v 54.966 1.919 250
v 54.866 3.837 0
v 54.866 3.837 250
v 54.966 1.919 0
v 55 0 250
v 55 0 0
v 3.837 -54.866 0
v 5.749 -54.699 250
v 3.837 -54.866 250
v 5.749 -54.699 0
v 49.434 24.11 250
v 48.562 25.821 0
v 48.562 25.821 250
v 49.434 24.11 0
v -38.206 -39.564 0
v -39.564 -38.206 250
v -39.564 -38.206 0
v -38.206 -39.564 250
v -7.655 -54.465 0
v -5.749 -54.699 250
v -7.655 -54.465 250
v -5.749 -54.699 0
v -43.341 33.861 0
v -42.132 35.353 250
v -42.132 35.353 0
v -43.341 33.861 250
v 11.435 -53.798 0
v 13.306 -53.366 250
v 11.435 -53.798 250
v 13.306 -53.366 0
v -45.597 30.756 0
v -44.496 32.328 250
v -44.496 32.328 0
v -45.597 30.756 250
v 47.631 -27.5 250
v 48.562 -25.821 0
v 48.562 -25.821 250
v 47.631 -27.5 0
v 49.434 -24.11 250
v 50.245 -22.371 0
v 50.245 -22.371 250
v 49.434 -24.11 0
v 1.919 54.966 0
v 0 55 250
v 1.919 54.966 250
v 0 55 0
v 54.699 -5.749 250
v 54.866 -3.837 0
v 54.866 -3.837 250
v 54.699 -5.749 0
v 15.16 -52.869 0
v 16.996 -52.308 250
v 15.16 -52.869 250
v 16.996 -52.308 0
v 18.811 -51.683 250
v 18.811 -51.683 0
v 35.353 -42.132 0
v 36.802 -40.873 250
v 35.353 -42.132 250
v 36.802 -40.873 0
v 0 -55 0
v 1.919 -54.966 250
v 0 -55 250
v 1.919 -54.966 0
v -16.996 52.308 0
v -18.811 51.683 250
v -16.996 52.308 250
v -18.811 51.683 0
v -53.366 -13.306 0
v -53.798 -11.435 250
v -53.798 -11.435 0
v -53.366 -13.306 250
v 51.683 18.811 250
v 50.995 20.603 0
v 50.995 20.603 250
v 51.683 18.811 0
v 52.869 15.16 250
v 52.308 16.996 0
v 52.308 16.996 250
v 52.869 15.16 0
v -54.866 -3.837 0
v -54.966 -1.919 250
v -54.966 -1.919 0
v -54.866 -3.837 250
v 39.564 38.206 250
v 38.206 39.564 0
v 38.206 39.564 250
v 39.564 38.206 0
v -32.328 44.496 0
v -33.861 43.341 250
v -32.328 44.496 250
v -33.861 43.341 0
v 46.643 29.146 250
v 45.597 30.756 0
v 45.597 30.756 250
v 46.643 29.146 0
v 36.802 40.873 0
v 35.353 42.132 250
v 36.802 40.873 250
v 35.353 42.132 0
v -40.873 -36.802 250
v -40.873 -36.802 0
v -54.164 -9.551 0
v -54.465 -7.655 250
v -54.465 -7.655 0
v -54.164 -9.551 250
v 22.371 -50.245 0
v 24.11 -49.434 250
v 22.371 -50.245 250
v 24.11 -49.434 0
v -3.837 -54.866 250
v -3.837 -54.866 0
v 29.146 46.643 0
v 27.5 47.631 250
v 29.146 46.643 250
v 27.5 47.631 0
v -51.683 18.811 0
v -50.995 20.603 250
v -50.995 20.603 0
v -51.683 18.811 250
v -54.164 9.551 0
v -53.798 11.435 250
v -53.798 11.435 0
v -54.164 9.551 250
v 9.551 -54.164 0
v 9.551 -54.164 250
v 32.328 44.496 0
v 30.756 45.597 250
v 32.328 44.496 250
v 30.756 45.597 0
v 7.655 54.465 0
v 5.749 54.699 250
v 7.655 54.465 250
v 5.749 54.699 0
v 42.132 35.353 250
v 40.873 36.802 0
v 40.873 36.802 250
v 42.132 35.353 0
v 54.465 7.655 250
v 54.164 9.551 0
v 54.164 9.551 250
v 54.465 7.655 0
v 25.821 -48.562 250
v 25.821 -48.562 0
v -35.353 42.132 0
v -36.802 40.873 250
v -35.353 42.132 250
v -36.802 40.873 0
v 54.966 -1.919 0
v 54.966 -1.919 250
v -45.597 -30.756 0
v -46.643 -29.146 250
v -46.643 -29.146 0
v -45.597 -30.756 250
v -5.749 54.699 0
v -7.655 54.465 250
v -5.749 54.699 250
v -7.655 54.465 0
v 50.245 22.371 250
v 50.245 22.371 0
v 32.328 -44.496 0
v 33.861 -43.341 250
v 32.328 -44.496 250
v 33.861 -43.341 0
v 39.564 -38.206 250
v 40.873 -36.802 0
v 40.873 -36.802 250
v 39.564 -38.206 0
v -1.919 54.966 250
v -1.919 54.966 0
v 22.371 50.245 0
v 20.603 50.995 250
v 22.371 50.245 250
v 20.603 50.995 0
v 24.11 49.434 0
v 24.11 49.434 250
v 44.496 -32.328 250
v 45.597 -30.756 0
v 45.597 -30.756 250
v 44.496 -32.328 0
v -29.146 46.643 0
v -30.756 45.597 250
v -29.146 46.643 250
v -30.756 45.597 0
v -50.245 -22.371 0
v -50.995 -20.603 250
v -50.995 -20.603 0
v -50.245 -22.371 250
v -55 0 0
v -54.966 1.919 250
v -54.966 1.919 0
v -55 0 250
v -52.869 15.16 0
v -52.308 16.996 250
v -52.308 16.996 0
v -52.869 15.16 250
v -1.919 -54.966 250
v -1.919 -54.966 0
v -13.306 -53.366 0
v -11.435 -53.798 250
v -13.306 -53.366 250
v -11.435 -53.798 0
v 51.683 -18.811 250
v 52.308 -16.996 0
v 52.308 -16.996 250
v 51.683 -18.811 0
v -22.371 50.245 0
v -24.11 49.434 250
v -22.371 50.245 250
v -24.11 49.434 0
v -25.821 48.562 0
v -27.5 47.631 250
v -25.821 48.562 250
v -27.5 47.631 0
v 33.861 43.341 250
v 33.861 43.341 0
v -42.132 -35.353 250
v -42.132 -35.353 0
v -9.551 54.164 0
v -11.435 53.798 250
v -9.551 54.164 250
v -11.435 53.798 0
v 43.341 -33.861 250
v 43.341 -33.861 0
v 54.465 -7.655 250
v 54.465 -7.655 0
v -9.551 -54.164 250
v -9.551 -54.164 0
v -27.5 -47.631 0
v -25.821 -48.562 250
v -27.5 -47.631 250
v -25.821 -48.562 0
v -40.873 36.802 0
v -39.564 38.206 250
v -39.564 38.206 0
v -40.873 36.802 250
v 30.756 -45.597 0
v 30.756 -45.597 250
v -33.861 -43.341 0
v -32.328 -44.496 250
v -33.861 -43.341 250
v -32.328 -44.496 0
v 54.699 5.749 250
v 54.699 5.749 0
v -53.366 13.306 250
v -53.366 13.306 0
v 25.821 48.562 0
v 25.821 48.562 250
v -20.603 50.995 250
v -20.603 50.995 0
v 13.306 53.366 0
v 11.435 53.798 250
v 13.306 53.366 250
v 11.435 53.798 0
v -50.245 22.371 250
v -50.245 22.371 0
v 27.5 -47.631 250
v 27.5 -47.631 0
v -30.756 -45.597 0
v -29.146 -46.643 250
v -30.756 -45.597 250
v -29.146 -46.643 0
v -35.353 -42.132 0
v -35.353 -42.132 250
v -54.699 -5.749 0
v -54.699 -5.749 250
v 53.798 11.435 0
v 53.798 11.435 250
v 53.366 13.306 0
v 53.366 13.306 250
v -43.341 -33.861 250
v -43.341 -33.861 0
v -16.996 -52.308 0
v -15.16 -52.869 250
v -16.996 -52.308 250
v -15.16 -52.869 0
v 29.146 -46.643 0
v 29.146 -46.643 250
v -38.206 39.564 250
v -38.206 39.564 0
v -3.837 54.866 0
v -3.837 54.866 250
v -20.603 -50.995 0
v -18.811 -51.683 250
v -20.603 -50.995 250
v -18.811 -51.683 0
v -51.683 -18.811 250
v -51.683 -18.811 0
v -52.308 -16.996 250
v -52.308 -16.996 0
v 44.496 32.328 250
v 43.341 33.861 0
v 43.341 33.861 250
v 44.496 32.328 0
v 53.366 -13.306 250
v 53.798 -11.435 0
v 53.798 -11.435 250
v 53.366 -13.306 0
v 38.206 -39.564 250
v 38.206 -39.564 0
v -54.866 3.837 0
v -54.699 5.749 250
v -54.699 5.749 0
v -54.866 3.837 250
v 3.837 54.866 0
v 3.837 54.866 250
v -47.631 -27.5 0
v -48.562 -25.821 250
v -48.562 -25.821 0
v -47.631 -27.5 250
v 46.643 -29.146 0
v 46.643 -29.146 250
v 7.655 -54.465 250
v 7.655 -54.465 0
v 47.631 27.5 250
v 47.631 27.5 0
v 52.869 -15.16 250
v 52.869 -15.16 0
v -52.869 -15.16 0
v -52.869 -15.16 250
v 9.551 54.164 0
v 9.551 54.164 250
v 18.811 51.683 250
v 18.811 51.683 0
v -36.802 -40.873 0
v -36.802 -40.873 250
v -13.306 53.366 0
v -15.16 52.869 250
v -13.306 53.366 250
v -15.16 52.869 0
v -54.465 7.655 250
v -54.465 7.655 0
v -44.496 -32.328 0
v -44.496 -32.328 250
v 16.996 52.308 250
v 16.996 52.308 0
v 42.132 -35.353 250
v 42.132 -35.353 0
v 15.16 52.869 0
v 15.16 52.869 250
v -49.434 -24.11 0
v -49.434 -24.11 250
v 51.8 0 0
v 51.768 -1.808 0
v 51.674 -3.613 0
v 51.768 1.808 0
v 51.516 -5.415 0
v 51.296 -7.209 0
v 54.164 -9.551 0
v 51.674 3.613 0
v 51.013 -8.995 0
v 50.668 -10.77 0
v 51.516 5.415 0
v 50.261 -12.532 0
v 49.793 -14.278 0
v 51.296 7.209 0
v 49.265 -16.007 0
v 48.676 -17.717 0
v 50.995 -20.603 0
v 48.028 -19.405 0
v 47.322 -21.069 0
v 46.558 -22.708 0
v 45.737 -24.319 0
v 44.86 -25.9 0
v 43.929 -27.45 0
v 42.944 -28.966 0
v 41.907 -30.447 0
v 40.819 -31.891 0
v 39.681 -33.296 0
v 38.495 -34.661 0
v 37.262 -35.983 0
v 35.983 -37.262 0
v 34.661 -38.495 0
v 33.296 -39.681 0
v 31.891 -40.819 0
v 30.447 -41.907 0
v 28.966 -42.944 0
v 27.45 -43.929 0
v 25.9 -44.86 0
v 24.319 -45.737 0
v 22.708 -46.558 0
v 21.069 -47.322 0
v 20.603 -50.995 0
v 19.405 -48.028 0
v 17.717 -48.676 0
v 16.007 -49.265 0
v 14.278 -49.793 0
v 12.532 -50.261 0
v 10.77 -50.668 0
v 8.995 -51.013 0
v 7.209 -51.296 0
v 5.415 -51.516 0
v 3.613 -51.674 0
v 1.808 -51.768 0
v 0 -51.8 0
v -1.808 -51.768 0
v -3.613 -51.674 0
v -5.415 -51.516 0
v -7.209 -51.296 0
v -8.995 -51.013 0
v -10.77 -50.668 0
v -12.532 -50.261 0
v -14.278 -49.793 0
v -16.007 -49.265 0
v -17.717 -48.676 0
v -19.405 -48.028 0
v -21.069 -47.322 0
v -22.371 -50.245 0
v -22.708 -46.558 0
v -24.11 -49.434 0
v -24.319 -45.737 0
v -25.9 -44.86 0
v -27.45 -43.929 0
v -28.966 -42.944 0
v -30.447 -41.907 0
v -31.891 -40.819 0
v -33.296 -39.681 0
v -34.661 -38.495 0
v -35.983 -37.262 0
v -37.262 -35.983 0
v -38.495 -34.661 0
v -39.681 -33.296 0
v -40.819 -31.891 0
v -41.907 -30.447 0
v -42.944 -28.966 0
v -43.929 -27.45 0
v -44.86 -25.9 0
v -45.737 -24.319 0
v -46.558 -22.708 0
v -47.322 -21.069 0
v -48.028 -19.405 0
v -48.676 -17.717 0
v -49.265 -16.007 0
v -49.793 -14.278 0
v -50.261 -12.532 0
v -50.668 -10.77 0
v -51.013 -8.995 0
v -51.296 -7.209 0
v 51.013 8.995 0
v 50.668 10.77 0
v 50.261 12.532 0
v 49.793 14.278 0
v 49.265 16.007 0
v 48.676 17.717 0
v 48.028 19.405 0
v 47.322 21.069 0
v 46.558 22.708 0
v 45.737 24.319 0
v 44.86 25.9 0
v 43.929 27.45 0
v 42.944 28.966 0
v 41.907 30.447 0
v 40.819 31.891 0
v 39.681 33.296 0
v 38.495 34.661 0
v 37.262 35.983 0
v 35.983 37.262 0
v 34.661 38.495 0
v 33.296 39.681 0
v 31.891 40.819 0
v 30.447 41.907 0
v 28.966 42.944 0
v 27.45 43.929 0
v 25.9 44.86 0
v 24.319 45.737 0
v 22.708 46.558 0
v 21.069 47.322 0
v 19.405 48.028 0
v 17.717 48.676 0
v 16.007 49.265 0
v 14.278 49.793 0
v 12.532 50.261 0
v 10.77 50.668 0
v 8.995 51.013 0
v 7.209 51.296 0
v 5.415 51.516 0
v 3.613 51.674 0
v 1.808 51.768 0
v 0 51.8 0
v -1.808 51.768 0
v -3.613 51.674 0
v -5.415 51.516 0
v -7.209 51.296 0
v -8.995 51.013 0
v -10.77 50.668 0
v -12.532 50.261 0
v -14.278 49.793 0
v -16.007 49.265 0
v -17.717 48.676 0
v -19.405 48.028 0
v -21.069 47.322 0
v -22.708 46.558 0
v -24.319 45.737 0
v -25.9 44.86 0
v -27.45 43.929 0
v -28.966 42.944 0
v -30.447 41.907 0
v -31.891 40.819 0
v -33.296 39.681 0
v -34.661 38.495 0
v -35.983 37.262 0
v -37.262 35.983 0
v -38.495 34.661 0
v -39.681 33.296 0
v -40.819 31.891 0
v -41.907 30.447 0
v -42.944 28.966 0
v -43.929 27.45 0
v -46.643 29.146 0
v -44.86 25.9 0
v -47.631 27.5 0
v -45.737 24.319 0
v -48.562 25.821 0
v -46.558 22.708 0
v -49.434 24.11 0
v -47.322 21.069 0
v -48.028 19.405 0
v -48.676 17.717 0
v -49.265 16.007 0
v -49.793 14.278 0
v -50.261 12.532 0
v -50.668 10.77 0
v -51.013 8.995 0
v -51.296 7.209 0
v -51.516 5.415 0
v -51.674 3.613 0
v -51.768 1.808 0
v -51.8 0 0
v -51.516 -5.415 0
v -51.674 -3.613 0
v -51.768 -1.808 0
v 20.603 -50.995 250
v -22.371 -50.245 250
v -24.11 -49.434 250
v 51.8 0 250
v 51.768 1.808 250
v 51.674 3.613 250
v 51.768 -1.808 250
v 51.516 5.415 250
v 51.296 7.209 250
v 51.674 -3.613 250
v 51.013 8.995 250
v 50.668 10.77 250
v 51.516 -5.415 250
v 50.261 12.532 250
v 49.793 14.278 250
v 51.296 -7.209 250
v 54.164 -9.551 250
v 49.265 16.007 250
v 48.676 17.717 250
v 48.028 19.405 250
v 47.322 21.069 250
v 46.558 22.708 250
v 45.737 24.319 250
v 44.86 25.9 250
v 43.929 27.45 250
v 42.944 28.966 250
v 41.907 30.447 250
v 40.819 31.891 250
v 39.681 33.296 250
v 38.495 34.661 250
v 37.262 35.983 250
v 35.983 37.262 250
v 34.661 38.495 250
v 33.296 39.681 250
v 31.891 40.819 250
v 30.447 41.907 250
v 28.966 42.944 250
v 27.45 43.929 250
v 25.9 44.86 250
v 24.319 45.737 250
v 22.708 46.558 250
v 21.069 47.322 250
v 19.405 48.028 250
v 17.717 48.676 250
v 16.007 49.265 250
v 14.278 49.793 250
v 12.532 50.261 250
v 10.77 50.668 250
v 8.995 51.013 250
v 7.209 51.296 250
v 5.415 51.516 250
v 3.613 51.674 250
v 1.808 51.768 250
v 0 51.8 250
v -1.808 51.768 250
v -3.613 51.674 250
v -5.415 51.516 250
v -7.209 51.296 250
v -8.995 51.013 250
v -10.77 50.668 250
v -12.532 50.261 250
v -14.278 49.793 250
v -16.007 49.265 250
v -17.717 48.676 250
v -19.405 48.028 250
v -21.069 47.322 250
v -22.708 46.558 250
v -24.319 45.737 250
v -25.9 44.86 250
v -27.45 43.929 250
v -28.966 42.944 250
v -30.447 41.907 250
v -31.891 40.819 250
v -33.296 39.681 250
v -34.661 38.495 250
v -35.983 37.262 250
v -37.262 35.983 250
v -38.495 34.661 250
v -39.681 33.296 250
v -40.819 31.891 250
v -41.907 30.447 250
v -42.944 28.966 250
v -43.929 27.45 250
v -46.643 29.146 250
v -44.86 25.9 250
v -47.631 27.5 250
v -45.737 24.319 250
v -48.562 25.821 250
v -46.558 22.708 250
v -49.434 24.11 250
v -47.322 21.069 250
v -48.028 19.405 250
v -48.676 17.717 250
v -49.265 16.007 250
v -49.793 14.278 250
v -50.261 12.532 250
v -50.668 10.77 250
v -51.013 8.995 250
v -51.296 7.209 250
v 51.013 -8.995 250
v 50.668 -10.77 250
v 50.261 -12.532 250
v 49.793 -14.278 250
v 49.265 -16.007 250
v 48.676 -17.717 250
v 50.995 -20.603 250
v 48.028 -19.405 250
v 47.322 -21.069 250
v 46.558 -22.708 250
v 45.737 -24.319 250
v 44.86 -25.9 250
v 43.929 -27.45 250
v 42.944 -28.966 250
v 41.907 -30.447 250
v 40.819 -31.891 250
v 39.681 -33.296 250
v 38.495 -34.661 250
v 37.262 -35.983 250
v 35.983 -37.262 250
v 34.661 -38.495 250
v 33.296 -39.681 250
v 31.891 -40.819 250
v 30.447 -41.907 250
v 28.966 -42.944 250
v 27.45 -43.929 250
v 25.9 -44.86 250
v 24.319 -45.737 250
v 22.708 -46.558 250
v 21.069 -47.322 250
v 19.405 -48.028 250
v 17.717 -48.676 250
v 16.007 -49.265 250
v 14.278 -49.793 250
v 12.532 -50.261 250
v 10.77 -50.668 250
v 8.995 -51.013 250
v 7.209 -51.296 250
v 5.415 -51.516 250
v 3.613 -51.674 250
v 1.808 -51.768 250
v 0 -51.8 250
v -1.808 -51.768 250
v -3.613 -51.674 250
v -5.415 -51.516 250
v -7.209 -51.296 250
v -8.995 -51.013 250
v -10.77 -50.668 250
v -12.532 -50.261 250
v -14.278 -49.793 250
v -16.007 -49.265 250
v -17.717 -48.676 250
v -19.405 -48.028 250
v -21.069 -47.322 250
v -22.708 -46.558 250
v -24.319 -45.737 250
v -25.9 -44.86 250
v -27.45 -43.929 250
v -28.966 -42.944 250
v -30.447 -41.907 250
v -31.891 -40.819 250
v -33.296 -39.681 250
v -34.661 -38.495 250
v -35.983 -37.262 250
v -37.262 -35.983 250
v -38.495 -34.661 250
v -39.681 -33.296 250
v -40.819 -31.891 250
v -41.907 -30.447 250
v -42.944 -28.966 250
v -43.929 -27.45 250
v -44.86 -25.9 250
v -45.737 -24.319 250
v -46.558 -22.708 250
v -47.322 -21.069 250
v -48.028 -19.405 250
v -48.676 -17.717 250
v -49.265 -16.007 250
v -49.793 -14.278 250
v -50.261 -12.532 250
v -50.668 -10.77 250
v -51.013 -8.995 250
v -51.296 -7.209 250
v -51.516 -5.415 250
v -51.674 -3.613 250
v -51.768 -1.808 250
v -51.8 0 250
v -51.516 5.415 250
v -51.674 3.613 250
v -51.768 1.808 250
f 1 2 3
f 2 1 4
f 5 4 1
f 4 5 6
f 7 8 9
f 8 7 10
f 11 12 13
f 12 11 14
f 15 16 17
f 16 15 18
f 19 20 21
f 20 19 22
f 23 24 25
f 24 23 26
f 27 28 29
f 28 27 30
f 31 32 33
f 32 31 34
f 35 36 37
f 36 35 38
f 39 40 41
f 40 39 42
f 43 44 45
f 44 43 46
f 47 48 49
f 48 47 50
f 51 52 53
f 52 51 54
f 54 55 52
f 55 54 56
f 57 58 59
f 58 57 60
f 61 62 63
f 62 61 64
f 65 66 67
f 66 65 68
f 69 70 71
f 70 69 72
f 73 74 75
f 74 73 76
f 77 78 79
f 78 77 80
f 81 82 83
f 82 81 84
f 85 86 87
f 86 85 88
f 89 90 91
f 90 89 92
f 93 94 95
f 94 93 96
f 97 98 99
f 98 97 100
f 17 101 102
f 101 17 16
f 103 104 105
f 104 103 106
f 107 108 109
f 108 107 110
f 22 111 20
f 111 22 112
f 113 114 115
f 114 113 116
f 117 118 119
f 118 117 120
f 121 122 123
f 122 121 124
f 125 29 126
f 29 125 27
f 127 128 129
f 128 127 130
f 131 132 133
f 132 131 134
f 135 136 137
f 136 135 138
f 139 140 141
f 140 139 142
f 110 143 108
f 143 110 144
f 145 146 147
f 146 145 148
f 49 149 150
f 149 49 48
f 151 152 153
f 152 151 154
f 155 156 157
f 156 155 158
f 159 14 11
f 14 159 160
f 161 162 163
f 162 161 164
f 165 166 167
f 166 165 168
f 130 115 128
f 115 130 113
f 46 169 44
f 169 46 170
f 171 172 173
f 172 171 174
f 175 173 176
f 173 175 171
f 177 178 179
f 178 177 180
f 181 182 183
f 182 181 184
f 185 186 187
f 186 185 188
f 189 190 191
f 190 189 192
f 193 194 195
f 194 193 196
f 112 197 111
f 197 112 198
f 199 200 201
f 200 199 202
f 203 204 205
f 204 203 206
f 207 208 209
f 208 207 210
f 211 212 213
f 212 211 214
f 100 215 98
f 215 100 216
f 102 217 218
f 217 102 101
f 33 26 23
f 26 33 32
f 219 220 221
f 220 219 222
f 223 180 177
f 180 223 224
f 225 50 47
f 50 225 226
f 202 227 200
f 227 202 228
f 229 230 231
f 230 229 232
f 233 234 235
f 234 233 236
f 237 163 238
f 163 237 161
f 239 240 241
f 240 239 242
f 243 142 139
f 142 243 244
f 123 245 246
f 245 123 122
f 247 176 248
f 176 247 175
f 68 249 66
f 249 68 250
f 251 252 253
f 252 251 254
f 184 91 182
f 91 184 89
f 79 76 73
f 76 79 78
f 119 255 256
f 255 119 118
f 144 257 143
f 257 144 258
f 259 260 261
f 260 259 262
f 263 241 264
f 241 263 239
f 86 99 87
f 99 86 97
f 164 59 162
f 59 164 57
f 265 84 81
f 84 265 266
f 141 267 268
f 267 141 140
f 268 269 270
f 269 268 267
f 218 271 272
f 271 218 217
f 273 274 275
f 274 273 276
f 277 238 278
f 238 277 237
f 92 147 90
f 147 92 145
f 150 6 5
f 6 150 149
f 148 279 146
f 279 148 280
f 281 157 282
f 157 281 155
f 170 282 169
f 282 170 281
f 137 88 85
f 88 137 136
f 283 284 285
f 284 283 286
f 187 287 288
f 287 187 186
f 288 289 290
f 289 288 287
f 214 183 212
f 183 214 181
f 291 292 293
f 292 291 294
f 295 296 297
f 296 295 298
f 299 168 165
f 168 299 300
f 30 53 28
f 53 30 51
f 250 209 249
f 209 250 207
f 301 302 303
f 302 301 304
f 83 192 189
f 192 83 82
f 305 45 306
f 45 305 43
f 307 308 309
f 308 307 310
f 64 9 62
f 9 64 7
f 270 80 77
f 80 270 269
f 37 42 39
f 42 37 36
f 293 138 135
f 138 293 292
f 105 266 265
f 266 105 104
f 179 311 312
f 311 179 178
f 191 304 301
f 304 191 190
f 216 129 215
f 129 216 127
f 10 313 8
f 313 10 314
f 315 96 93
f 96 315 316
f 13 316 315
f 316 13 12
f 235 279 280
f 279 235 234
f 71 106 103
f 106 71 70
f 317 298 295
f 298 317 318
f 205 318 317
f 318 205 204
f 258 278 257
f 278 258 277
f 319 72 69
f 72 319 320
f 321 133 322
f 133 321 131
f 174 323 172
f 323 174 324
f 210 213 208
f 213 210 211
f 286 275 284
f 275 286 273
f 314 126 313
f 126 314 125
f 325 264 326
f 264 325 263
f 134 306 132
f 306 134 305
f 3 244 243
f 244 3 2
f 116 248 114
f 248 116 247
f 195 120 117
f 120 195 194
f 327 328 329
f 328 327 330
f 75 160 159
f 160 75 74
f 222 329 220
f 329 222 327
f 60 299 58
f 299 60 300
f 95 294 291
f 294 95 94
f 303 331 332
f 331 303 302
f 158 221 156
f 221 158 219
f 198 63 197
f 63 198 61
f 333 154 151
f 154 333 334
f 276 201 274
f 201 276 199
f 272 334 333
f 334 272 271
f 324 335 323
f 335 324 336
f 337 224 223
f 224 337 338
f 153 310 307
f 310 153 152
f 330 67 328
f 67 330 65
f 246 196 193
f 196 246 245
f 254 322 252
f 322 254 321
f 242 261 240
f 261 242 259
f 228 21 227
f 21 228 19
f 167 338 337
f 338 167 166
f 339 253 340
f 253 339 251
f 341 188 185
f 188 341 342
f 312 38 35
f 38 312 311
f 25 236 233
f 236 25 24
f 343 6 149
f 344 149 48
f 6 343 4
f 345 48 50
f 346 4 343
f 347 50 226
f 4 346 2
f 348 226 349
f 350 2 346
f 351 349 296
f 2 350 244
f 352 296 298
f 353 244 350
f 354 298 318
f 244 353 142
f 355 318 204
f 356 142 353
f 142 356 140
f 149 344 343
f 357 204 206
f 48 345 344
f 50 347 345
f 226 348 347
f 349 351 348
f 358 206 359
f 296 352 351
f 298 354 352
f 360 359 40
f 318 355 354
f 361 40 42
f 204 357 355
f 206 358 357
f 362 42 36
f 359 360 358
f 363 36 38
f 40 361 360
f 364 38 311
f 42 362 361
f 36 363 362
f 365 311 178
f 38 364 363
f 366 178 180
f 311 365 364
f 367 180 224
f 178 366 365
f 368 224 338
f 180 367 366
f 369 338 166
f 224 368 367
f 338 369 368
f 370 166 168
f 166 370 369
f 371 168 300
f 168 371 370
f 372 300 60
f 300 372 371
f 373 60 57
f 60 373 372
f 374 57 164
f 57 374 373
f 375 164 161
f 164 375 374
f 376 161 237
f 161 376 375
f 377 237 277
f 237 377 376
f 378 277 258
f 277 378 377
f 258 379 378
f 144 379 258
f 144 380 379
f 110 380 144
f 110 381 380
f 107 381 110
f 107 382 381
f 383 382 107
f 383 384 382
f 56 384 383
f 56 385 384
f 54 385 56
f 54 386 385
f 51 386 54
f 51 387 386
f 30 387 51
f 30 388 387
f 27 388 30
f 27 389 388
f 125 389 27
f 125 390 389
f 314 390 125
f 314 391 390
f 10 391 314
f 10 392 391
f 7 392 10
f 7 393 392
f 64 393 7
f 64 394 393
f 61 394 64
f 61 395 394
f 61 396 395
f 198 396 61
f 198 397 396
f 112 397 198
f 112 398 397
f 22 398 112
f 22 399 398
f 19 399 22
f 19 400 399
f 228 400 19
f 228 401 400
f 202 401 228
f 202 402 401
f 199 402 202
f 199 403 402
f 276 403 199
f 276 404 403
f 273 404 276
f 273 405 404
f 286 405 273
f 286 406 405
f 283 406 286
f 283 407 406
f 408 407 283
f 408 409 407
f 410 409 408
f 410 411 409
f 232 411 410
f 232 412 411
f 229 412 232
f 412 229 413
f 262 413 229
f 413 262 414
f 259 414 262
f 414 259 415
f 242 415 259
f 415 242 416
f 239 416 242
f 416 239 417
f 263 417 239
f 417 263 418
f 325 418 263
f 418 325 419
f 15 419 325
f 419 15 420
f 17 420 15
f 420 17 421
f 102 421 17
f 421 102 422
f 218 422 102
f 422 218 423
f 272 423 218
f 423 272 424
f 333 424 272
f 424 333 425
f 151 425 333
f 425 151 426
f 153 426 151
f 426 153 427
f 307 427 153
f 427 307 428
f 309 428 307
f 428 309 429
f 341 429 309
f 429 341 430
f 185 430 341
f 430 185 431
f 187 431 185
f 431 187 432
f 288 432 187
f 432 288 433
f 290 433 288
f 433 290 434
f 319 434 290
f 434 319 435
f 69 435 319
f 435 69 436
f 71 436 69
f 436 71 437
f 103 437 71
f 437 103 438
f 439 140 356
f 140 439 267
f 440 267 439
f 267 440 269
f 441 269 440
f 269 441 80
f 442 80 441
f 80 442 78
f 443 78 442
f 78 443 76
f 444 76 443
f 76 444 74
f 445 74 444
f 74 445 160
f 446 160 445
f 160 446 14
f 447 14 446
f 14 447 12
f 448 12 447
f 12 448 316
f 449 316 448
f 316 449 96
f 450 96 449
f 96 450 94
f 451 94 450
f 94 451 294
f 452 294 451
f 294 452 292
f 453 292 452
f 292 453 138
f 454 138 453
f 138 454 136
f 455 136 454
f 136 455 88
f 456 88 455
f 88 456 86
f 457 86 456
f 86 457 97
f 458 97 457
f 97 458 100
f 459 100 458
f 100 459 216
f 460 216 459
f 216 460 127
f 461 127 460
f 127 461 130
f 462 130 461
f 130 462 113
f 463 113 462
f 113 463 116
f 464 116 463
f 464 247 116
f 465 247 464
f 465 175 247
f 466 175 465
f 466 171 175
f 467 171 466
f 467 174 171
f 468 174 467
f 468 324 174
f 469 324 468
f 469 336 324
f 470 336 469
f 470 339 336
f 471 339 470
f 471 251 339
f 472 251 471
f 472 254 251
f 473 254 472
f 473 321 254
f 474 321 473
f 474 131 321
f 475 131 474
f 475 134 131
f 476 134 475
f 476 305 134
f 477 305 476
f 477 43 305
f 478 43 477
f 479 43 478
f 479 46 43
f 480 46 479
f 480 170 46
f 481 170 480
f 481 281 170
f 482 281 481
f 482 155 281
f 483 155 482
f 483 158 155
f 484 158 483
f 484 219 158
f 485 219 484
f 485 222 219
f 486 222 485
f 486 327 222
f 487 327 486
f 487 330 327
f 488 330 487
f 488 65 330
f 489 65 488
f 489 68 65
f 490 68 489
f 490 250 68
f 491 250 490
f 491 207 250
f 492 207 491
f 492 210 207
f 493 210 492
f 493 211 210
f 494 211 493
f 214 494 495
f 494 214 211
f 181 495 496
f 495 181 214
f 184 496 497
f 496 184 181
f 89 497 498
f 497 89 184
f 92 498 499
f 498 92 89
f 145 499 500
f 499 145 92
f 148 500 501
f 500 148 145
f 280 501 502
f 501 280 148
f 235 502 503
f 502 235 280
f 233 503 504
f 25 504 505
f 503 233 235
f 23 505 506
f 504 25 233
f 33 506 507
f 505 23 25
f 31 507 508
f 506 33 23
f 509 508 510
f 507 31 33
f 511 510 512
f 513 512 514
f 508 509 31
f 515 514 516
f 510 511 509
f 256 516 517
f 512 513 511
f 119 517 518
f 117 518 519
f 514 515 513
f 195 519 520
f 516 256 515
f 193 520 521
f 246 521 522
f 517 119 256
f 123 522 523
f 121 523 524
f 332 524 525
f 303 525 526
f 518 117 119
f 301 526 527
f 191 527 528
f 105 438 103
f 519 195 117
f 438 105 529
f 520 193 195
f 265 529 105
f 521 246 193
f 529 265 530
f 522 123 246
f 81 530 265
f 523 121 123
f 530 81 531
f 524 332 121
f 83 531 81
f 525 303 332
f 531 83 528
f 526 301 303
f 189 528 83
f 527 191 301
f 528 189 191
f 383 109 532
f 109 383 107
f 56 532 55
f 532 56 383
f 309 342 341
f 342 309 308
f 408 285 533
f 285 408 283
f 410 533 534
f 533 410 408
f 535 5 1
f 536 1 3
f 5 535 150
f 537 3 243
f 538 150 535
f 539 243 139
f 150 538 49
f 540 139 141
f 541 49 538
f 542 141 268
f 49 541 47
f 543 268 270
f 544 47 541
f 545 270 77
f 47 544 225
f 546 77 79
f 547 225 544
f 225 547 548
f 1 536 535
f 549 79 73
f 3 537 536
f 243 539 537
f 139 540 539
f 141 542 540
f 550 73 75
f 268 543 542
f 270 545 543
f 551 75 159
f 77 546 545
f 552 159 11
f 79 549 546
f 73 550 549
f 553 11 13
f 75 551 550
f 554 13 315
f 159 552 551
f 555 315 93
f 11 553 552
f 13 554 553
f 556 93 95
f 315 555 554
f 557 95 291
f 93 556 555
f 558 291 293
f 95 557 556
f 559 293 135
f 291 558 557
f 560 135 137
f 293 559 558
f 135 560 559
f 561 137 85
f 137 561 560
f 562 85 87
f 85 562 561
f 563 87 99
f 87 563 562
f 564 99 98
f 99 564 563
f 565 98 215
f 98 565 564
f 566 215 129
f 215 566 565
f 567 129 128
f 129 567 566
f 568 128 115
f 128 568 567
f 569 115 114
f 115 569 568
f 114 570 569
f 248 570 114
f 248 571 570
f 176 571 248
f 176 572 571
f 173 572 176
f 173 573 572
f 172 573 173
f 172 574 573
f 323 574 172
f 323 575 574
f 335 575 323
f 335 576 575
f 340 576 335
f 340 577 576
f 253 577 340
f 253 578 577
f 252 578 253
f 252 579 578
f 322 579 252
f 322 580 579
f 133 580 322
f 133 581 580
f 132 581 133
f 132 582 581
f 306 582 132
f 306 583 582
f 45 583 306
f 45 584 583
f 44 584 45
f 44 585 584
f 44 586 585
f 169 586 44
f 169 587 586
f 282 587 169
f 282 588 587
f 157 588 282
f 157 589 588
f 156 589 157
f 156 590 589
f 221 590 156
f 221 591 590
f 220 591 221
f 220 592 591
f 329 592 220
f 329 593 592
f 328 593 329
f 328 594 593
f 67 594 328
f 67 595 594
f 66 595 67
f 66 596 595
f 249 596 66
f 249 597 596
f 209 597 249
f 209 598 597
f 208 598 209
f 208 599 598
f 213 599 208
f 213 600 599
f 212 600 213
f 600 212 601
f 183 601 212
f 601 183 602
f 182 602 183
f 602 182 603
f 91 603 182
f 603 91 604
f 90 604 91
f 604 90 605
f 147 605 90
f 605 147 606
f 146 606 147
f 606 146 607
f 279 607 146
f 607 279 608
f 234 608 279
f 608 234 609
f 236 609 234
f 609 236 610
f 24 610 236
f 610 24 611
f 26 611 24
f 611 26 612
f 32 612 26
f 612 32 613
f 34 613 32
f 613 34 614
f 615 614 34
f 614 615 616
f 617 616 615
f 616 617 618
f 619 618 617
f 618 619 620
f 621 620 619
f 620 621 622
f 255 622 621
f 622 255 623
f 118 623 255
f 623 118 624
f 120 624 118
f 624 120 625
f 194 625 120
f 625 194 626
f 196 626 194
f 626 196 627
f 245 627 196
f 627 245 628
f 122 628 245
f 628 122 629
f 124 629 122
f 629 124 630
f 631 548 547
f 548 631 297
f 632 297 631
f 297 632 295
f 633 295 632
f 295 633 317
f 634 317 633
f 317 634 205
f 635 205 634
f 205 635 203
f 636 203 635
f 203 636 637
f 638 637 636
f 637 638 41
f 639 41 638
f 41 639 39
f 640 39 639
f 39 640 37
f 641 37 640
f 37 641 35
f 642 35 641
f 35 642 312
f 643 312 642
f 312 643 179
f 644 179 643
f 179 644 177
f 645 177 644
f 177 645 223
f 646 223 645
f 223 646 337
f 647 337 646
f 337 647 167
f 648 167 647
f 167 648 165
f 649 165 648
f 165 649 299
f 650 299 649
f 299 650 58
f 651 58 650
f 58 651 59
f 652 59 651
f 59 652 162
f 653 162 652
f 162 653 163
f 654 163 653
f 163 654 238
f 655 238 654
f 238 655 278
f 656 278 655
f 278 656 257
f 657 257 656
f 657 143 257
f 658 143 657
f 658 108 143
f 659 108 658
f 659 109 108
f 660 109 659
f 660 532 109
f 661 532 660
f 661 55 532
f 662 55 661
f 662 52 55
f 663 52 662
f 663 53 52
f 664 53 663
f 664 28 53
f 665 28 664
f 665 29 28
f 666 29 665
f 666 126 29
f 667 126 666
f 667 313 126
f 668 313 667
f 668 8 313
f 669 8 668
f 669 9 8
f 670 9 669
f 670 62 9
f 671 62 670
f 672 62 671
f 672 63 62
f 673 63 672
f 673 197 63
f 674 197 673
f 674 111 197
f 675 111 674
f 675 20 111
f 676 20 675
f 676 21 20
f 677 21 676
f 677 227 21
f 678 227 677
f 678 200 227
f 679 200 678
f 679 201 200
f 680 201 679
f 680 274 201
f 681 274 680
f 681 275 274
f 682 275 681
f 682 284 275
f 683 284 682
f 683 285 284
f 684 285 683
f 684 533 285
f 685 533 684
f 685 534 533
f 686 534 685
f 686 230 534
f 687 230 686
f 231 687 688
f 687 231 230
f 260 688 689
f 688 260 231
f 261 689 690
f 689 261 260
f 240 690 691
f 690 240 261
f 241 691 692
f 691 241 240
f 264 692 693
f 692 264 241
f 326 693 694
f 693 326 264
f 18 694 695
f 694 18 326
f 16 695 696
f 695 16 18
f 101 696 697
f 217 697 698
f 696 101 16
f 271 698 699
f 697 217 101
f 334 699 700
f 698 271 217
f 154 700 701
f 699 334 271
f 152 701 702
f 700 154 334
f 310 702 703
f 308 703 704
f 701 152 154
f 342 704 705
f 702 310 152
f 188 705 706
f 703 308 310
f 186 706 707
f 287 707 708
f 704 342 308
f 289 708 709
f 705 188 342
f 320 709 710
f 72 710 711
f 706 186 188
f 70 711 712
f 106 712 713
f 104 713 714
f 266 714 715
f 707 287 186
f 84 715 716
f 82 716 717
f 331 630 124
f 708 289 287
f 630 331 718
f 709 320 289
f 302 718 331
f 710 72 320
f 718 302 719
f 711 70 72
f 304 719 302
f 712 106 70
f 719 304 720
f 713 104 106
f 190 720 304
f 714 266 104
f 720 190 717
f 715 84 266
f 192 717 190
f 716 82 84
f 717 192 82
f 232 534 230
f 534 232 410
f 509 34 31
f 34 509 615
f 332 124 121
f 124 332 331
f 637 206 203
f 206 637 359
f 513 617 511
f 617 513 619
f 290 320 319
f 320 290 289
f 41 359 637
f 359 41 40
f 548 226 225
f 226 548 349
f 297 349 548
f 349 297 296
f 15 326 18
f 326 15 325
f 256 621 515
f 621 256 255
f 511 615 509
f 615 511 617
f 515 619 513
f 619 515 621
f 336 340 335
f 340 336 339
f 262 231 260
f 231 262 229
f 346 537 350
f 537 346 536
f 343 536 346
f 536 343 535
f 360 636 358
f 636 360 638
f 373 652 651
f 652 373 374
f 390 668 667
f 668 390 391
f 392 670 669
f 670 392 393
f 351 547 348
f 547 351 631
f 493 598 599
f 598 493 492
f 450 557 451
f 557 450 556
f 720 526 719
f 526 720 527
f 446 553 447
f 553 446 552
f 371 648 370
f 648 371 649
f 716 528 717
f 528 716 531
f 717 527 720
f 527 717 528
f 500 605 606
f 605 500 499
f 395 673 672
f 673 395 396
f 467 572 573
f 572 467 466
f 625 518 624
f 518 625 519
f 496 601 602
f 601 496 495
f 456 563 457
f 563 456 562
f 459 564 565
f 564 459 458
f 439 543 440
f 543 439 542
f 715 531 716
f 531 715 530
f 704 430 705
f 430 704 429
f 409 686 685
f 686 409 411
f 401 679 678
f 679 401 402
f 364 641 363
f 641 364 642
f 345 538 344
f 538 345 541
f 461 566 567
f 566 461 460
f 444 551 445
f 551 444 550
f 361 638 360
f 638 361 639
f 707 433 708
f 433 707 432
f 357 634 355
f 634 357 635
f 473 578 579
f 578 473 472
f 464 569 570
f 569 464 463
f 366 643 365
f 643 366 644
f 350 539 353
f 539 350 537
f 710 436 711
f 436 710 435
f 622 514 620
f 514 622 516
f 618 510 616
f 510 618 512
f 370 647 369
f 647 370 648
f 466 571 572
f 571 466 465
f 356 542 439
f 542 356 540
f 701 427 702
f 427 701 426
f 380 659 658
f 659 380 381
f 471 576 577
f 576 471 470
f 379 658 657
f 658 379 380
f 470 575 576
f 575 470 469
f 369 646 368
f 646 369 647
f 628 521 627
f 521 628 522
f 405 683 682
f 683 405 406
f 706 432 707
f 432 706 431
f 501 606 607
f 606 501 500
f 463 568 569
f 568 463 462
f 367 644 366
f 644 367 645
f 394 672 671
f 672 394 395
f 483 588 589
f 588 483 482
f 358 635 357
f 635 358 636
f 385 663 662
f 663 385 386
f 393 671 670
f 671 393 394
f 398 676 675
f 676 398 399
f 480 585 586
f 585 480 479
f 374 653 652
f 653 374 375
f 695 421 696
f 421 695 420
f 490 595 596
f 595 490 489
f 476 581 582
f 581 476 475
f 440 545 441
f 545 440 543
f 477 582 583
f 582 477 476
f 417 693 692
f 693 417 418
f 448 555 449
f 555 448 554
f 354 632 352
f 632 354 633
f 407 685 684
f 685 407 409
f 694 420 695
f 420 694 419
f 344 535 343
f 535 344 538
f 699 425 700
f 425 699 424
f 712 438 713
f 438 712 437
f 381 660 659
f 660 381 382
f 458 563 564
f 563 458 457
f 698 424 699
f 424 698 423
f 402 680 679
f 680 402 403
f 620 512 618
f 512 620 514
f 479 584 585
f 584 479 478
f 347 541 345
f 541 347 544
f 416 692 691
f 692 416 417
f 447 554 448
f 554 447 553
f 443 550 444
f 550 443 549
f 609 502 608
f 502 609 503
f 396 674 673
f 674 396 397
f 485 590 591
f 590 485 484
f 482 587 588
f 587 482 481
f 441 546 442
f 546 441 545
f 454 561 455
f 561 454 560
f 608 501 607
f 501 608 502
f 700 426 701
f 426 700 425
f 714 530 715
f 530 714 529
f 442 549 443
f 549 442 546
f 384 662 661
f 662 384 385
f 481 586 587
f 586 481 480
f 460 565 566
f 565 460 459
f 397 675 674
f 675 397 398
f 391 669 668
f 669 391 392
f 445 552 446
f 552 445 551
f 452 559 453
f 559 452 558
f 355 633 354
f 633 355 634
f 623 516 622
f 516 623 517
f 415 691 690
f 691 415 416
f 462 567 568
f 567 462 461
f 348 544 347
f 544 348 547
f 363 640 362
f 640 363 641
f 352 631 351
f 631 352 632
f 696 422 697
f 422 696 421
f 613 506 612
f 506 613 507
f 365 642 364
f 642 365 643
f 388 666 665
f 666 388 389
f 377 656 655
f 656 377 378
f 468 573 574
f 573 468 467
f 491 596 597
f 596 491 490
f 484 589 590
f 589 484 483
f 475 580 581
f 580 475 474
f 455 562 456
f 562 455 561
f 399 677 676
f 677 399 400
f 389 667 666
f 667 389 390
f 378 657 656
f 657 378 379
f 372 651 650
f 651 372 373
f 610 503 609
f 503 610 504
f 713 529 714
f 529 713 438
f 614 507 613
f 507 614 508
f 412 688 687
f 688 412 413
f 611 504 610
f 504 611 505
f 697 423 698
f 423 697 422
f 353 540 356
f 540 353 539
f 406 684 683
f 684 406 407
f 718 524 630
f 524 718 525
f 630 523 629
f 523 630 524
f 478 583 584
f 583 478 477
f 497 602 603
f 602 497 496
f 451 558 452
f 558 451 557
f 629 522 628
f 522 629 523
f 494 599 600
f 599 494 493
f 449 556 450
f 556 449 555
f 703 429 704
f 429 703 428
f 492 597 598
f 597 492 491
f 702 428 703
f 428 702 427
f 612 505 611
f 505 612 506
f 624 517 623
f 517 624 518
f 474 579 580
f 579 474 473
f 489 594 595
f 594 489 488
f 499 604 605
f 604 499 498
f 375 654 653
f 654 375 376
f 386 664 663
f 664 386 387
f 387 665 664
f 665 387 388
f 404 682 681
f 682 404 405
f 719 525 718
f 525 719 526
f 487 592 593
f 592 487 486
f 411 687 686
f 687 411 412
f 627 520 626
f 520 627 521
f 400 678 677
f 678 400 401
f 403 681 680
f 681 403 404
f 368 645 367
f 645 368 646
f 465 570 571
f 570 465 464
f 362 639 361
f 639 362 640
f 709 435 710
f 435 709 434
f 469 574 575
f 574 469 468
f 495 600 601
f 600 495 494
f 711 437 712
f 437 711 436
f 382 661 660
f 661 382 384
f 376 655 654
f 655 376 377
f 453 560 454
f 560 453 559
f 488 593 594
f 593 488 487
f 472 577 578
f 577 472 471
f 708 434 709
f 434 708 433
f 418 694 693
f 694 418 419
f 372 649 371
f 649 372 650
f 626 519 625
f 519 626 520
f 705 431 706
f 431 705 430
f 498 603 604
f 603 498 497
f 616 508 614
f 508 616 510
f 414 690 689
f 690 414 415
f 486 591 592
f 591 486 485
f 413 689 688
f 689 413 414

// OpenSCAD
$fn = 180;

// HT pipe parameters (approximate for HT 110)
od = 110;          // outer diameter (mm)
wall = 3.2;        // wall thickness (mm) typical for HT 110
len = 250;         // length (mm)

id = od - 2*wall;

difference() {
    cylinder(h = len, d = od, center = false);
    translate([0,0,-0.1])
        cylinder(h = len + 0.2, d = id, center = false);
}
